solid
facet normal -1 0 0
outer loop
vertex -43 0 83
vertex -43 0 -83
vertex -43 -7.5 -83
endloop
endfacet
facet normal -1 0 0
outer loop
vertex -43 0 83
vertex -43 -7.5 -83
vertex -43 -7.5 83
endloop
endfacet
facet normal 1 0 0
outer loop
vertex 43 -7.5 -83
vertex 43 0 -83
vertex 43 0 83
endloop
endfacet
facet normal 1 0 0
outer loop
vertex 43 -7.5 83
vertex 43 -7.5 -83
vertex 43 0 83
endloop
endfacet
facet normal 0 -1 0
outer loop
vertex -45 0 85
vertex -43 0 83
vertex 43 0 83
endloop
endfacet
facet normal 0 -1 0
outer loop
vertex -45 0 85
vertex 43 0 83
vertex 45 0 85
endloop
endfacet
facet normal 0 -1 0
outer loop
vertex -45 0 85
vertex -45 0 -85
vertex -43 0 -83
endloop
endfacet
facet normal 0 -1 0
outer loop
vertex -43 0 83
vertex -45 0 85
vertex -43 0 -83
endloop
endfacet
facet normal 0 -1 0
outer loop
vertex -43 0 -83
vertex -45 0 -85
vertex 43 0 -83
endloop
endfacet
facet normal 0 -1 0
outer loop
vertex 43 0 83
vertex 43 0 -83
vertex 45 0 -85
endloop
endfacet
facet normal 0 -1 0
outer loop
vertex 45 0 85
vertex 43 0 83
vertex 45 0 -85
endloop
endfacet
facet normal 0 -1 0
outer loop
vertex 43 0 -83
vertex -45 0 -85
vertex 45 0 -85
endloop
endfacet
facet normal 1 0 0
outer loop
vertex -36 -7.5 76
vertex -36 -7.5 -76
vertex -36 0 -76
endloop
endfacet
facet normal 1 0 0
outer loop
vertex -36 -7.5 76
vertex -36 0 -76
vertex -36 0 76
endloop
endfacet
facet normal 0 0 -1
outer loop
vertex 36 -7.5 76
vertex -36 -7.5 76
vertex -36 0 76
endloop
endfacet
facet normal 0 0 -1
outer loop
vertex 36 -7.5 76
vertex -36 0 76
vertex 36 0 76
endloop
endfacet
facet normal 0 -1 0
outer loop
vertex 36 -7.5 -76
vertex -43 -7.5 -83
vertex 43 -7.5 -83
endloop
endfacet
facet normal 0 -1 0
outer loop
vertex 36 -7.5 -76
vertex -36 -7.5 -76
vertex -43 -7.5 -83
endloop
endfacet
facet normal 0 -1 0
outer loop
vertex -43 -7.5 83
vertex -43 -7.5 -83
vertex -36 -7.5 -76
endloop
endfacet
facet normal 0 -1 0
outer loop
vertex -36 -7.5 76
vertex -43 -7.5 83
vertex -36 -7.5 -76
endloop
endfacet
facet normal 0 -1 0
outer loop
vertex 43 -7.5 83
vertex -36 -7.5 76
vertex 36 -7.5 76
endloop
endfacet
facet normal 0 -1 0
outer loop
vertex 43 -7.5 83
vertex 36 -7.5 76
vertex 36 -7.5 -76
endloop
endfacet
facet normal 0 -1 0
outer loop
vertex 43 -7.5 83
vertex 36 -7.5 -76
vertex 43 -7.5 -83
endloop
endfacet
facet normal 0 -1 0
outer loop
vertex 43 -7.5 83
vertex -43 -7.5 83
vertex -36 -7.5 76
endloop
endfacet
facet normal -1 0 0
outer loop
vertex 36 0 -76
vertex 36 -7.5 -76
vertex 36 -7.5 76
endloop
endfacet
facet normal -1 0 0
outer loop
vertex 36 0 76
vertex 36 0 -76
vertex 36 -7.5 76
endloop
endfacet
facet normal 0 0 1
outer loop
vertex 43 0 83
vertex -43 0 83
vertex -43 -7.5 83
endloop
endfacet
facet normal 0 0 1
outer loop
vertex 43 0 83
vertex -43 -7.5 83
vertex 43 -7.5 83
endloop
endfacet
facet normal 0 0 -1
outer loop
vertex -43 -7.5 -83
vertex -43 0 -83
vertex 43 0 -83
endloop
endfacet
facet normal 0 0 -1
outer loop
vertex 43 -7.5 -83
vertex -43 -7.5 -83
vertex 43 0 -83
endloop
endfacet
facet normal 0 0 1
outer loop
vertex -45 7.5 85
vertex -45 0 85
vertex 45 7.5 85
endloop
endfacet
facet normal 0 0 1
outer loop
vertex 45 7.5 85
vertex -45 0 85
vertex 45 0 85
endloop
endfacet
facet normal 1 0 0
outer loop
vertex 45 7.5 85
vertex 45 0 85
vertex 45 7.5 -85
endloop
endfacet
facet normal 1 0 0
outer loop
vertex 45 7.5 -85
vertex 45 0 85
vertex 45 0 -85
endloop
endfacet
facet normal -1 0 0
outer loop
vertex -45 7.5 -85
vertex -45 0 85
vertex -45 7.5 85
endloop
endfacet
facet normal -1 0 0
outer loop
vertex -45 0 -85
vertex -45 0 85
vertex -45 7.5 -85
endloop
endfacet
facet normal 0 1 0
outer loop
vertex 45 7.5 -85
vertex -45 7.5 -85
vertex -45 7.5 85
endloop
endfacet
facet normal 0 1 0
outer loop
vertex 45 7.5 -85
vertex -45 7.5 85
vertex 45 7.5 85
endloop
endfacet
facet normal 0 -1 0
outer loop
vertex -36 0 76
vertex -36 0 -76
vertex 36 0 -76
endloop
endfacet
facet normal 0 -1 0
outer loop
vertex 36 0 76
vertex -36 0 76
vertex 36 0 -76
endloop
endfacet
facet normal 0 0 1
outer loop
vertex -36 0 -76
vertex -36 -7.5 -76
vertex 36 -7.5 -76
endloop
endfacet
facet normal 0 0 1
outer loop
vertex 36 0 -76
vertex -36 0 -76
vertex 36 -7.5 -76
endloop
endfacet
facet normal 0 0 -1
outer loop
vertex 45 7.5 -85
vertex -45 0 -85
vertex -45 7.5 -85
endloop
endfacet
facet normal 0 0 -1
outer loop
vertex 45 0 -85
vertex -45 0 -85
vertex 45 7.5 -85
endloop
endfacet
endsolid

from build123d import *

# Parameters (mm, degrees)
SKETCH1_W           = 90
SKETCH1_H           = 170
BOSS_EXTRUDE1_DEPTH = 7.5
SKETCH2_W           = 86
SKETCH2_H           = 166
BOSS_EXTRUDE2_DEPTH = 7.5
SKETCH5_W           = 72
SKETCH5_H           = 152
CUT_EXTRUDE1_DEPTH  = 7.5


with BuildPart() as part:
    # Sketch1 → Boss-Extrude1 (new body)
    with BuildSketch(Plane(origin=(0, 0, 0), x_dir=(1, 0, 0), z_dir=(0, 1, 0))):
        Rectangle(SKETCH1_W, SKETCH1_H)
    extrude(amount=BOSS_EXTRUDE1_DEPTH)

    # Sketch2 → Boss-Extrude2 (add)
    with BuildSketch(Plane.XZ):
        Rectangle(SKETCH2_W, SKETCH2_H)
    extrude(amount=BOSS_EXTRUDE2_DEPTH)

    # Sketch5 → Cut-Extrude1 (cut)
    with BuildSketch(Plane.XZ.offset(7.5)):
        Rectangle(SKETCH5_W, SKETCH5_H)
    extrude(amount=-CUT_EXTRUDE1_DEPTH, mode=Mode.SUBTRACT)


solid = part.part
